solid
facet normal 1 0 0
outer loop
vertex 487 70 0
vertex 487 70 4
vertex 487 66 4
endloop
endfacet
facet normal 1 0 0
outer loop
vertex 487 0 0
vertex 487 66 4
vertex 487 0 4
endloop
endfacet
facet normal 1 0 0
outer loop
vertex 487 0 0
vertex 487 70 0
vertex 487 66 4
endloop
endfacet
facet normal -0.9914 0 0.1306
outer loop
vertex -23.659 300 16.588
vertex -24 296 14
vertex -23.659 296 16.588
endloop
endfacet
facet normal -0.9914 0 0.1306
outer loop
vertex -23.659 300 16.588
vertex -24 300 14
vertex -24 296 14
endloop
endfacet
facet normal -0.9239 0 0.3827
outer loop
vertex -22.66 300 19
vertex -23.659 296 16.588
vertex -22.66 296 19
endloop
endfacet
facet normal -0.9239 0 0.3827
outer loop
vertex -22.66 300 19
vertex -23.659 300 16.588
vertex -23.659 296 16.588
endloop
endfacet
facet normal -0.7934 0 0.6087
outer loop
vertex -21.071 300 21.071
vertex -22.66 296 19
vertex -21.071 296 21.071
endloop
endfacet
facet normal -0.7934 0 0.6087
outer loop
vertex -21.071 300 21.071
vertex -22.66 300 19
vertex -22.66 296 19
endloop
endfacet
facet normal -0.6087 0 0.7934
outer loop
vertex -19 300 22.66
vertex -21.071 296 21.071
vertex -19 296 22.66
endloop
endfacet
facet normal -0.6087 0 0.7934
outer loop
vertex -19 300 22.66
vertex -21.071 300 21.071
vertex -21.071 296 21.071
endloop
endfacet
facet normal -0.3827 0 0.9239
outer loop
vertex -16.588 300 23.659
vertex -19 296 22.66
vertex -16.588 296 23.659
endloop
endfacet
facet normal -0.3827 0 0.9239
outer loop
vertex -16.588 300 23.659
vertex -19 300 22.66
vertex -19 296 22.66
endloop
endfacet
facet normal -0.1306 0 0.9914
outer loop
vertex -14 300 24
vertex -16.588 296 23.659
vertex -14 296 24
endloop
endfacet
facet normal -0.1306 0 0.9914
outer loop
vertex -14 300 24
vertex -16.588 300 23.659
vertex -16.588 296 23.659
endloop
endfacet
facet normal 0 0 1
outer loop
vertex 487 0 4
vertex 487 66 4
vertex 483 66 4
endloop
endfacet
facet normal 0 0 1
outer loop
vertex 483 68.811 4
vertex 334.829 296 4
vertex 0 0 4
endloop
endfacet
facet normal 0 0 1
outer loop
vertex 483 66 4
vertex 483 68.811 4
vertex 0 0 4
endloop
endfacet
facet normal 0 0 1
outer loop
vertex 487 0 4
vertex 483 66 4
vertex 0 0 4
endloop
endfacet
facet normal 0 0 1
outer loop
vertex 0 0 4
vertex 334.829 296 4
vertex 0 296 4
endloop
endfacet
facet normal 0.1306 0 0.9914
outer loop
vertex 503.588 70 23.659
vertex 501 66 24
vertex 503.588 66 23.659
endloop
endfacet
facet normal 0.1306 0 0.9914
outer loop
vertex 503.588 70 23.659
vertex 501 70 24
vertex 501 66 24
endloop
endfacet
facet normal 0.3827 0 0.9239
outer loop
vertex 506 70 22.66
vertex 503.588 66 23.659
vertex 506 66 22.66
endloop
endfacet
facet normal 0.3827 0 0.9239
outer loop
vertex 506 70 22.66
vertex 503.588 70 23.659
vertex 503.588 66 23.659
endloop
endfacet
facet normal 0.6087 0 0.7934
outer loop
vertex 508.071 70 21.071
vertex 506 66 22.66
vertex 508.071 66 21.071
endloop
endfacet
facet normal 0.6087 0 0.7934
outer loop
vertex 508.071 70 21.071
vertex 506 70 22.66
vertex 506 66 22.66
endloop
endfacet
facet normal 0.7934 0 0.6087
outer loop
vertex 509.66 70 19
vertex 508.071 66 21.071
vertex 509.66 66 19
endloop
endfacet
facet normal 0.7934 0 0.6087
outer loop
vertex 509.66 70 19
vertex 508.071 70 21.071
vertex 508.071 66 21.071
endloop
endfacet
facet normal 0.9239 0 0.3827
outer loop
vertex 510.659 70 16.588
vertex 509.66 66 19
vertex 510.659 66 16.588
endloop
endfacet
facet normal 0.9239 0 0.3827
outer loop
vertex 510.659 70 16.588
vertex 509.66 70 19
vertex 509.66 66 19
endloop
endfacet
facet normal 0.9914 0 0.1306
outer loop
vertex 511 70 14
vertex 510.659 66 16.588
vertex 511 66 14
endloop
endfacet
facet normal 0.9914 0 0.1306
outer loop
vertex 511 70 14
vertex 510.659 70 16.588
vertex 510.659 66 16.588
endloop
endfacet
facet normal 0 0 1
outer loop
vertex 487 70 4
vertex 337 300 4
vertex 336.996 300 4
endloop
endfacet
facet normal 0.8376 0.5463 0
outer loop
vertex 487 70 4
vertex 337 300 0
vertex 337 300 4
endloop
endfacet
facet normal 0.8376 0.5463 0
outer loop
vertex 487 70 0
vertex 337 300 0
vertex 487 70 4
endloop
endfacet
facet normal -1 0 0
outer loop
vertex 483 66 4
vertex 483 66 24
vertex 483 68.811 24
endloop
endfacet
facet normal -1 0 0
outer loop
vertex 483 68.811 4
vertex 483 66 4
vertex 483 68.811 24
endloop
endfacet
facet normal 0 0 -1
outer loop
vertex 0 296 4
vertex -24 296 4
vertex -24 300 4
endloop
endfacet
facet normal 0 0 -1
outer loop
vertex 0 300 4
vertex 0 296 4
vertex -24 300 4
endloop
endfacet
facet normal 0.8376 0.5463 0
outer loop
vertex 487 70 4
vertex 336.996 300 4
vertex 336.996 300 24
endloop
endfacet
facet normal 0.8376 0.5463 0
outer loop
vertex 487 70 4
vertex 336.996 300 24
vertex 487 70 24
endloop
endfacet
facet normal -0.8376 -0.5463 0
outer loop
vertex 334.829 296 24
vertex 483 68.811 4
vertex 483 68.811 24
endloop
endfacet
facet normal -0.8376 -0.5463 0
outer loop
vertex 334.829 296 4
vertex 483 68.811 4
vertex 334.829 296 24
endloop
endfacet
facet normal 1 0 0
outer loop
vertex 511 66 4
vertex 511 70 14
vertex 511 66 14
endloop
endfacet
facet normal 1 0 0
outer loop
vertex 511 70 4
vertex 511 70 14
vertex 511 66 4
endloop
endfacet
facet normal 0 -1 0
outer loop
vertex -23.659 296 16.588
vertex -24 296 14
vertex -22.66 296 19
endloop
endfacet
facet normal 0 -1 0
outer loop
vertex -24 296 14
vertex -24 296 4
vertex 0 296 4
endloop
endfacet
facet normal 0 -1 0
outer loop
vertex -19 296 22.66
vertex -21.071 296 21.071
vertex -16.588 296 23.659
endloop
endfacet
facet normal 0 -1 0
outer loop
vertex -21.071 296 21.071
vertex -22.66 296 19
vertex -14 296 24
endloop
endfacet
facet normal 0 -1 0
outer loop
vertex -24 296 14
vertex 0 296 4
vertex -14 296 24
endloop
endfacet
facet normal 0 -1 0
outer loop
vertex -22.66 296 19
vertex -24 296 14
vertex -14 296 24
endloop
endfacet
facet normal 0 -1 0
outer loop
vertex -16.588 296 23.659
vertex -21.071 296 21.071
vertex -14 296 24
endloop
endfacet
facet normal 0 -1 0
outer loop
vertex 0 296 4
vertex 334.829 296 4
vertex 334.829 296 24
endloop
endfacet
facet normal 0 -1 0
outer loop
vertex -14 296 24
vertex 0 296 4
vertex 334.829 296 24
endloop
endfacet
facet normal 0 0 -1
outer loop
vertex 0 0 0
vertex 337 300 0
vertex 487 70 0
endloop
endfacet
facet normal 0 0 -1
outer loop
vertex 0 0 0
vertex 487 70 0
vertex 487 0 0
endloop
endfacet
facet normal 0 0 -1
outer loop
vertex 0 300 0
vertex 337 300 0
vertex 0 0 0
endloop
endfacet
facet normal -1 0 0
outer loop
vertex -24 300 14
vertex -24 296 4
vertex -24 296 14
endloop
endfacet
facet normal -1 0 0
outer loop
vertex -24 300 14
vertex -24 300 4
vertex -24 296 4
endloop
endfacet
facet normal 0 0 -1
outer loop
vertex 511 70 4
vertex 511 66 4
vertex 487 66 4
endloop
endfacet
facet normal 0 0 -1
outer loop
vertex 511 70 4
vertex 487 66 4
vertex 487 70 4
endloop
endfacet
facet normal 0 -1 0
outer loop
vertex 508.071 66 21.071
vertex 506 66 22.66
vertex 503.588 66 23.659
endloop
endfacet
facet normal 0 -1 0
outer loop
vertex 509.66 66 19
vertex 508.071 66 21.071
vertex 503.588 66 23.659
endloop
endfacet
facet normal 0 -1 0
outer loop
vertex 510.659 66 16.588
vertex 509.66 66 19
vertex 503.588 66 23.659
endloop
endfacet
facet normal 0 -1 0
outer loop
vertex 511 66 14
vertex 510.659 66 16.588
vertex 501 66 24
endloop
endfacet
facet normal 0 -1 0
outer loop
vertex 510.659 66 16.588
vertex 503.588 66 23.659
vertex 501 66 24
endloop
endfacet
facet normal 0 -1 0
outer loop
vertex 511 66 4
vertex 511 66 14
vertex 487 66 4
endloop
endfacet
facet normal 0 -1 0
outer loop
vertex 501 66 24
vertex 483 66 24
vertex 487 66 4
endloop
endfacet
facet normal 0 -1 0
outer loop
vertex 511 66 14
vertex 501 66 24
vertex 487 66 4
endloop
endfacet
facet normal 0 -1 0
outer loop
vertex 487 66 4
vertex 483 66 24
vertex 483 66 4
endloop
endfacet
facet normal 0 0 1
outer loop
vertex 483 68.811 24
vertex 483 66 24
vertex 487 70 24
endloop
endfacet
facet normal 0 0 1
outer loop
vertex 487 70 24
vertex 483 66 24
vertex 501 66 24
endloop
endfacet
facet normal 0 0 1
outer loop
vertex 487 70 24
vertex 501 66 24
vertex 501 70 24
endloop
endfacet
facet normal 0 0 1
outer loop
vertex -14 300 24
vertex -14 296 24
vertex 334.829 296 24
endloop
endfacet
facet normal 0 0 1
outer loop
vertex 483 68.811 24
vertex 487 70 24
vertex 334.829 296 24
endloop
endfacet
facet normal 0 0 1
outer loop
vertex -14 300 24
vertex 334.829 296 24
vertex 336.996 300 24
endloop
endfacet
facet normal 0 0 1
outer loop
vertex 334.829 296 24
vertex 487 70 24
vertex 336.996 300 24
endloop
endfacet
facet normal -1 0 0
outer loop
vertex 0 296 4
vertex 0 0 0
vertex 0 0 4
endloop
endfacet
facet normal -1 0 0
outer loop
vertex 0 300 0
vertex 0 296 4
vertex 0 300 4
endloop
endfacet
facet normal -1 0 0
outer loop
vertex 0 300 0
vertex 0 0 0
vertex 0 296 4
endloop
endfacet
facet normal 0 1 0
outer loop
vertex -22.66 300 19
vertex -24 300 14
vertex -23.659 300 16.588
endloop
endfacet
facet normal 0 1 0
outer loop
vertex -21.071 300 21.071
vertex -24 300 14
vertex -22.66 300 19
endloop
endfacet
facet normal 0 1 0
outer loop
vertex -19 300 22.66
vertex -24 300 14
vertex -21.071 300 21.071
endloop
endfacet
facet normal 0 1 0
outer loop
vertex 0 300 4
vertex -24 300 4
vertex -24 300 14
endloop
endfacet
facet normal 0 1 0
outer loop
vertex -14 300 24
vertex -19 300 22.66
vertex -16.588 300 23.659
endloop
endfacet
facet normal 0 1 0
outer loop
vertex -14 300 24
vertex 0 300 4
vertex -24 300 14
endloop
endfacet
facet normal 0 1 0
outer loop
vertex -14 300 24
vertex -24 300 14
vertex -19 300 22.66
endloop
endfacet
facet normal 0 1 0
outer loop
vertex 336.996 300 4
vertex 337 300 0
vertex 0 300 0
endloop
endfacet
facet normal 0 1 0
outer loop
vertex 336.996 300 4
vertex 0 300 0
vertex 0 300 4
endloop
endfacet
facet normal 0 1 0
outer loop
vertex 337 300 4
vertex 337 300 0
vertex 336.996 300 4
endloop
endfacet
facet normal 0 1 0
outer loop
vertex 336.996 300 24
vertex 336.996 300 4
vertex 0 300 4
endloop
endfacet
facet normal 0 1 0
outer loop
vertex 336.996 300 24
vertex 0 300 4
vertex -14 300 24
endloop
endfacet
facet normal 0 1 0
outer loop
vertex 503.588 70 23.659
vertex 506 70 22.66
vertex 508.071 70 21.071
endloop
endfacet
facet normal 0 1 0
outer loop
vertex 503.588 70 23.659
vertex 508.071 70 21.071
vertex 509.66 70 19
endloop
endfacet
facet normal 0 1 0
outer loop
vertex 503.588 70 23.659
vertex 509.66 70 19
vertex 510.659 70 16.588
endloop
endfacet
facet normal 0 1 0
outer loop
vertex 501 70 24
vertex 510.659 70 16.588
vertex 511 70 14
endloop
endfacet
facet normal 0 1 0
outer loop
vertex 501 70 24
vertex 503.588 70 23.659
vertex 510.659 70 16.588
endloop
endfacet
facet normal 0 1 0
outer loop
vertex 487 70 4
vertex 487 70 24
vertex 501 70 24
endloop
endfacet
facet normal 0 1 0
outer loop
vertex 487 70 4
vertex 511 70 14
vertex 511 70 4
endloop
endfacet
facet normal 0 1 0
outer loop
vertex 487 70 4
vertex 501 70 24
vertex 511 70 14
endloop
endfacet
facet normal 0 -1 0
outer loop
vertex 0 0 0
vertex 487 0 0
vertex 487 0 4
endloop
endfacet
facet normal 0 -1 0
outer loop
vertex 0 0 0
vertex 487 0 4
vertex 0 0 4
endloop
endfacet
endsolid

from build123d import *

# Parameters (mm, degrees)
BOSS_EXTRUDE1_DEPTH = 4
SKETCH7_W           = 336.995970405
SKETCH7_H           = 4
BOSS_EXTRUDE2_DEPTH = 20
BOSS_EXTRUDE3_DEPTH = 20
SKETCH9_W           = 4
SKETCH9_H           = 4
BOSS_EXTRUDE4_DEPTH = 20
SKETCH10_W          = 20
SKETCH10_H          = 4
BOSS_EXTRUDE5_DEPTH = 24
SKETCH12_W          = 20
SKETCH12_H          = 4
BOSS_EXTRUDE6_DEPTH = 24
FILLET1_R           = 10


with BuildPart() as part:
    # Sketch1 → Boss-Extrude1 (new body)
    with BuildSketch(Plane.XY):
        Polygon((0, 0), (0, 300), (337, 300), (487, 70), (487, 0), align=None)
    extrude(amount=BOSS_EXTRUDE1_DEPTH)

    # Sketch7 → Boss-Extrude2 (add)
    with BuildSketch(Plane.XY.offset(4)):
        with Locations((168.497985203, 298)):
            Rectangle(SKETCH7_W, SKETCH7_H)
    extrude(amount=BOSS_EXTRUDE2_DEPTH)

    # Sketch8 → Boss-Extrude3 (add)
    with BuildSketch(Plane.XY.offset(4)):
        Polygon((336.995970405, 300), (487, 70), (483.649584471, 67.814887695), (333.645554877, 297.814887695), align=None)
    extrude(amount=BOSS_EXTRUDE3_DEPTH)

    # Sketch9 → Boss-Extrude4 (add)
    with BuildSketch(Plane.XY.offset(4)):
        with Locations((485, 68)):
            Rectangle(SKETCH9_W, SKETCH9_H)
    extrude(amount=BOSS_EXTRUDE4_DEPTH)

    # Sketch10 → Boss-Extrude5 (add)
    with BuildSketch(Plane(origin=(487, 0, 0), x_dir=(0, 0, -1), z_dir=(1, 0, 0))):
        with Locations((-14, 68)):
            Rectangle(SKETCH10_W, SKETCH10_H)
    extrude(amount=BOSS_EXTRUDE5_DEPTH)

    # Sketch12 → Boss-Extrude6 (add)
    with BuildSketch(Plane.ZY):
        with Locations((14, 298)):
            Rectangle(SKETCH12_W, SKETCH12_H)
    extrude(amount=BOSS_EXTRUDE6_DEPTH)

    # Fillet1
    fillet1_edges = [part.edges().sort_by_distance(p)[0] for p in [
        (511, 68, 24),
        (-24, 298, 24),
    ]]
    fillet(fillet1_edges, radius=FILLET1_R)


solid = part.part
